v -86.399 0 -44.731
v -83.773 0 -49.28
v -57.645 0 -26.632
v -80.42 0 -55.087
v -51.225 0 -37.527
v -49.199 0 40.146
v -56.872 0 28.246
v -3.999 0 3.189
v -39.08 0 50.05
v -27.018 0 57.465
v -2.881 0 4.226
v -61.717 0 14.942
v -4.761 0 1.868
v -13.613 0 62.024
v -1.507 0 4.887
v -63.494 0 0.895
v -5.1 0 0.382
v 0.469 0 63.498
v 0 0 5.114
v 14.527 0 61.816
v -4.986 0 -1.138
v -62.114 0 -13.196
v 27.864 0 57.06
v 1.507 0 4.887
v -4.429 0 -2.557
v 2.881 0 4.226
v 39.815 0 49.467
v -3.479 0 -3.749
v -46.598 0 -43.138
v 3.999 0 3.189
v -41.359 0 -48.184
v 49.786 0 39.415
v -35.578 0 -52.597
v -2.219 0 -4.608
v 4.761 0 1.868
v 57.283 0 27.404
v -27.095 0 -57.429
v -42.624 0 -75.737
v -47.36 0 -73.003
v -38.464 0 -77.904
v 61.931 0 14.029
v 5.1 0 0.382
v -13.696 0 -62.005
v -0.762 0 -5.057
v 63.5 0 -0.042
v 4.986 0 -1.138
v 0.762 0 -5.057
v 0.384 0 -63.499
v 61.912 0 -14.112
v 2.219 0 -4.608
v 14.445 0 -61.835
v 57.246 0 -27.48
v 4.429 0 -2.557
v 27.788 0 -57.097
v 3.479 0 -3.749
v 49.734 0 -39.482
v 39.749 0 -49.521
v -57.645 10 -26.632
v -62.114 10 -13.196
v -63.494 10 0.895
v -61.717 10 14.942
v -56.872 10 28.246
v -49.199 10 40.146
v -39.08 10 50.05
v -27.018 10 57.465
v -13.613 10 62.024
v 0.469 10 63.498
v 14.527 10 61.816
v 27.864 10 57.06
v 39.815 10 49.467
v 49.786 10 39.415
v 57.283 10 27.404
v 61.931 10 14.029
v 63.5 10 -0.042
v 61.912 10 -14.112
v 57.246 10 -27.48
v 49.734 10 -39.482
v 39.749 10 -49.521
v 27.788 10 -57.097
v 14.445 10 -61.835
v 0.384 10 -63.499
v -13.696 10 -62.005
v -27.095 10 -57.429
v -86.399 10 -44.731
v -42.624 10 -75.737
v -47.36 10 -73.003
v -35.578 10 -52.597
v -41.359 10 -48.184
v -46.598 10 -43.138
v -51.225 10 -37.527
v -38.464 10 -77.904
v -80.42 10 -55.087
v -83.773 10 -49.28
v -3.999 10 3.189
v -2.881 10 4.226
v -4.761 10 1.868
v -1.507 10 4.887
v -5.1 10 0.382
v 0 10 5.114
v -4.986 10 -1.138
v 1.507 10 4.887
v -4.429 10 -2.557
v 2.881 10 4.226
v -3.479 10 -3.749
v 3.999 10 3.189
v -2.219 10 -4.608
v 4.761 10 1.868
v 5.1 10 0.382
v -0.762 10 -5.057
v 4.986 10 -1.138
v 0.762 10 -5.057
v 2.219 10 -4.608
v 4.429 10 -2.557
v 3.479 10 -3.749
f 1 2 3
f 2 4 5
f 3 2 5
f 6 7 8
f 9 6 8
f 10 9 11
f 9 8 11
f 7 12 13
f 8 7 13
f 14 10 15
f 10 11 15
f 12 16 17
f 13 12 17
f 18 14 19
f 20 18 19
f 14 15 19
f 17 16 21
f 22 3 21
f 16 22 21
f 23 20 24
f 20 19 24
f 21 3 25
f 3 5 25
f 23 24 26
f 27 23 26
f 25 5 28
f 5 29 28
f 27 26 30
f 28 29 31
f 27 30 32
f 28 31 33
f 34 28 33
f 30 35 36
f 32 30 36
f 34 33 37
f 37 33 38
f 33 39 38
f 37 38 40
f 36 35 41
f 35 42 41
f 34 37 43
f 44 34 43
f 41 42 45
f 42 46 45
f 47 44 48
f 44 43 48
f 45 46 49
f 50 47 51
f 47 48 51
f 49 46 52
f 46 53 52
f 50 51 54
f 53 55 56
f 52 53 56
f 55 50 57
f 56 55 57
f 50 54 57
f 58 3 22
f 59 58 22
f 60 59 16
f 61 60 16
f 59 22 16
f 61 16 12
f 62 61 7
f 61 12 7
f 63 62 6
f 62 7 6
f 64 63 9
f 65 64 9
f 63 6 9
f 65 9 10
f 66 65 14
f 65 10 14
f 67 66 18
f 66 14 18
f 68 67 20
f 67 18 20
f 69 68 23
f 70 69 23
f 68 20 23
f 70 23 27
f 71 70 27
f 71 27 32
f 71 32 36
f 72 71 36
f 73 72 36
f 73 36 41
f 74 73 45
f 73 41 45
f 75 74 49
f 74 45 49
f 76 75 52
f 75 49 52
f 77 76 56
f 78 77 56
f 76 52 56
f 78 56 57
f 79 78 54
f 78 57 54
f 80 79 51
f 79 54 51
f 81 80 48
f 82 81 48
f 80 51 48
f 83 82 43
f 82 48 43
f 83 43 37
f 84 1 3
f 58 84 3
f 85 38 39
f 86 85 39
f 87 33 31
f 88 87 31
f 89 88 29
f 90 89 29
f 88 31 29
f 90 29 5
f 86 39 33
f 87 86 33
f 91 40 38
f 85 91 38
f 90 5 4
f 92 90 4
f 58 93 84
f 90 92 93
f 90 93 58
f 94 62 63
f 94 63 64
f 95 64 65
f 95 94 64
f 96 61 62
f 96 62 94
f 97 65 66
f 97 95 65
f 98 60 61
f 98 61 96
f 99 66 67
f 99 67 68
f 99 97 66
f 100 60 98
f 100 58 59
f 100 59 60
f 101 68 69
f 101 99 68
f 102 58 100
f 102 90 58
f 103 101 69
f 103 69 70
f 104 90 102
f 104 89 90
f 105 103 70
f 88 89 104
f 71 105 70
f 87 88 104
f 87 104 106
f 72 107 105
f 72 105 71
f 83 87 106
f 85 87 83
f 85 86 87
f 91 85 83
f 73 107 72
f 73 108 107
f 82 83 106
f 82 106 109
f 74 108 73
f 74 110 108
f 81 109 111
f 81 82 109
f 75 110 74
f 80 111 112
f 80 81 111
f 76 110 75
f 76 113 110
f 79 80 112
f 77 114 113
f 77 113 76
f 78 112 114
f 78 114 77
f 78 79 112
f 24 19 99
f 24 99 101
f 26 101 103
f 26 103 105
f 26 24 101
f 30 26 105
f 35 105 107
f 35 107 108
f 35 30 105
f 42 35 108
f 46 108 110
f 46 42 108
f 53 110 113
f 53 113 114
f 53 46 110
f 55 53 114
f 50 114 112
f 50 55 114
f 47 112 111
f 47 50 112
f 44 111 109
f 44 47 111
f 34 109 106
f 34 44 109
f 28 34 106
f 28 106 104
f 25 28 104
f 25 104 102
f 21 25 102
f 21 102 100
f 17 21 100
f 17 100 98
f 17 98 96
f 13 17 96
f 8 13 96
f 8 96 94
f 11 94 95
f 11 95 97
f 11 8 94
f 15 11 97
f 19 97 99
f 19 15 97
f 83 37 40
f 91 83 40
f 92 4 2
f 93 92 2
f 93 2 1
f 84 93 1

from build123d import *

# Parameters (mm, degrees)
SKETCH_1_R      = 5.114284372
EXTRUDE_1_DEPTH = 10


with BuildPart() as part:
    # 草图1 → 凸台-拉伸1 (new body)
    with BuildSketch(Plane(origin=(0, 0, 0), x_dir=(1, 0, 0), z_dir=(0, 1, 0))):
        with BuildLine():
            Line((-83.772735406, 49.280387531), (-86.399180334, 44.731251472))
            Line((-86.399180334, 44.731251472), (-57.64544126, 26.631806208))
            ThreePointArc((-57.64544126, 26.631806208), (45.081659194, -44.720174467), (-27.095022974, 57.429171421))
            Line((-27.095022974, 57.429171421), (-38.463553205, 77.903659286))
            Line((-38.463553205, 77.903659286), (-42.624266956, 75.73666196))
            Line((-42.624266956, 75.73666196), (-47.35960117, 73.002715477))
            Line((-47.35960117, 73.002715477), (-35.578301324, 52.596905564))
            ThreePointArc((-35.578301324, 52.596905564), (-44.050696451, 45.736048607), (-51.224672516, 37.527095886))
            Line((-51.224672516, 37.527095886), (-80.420062365, 55.08738758))
            Line((-80.420062365, 55.08738758), (-83.772735406, 49.280387531))
        make_face()
        with Locations(Location((0, 0, 0), (0, 0, 270))):
            Circle(SKETCH_1_R, mode=Mode.SUBTRACT)
    extrude(amount=EXTRUDE_1_DEPTH)


solid = part.part
